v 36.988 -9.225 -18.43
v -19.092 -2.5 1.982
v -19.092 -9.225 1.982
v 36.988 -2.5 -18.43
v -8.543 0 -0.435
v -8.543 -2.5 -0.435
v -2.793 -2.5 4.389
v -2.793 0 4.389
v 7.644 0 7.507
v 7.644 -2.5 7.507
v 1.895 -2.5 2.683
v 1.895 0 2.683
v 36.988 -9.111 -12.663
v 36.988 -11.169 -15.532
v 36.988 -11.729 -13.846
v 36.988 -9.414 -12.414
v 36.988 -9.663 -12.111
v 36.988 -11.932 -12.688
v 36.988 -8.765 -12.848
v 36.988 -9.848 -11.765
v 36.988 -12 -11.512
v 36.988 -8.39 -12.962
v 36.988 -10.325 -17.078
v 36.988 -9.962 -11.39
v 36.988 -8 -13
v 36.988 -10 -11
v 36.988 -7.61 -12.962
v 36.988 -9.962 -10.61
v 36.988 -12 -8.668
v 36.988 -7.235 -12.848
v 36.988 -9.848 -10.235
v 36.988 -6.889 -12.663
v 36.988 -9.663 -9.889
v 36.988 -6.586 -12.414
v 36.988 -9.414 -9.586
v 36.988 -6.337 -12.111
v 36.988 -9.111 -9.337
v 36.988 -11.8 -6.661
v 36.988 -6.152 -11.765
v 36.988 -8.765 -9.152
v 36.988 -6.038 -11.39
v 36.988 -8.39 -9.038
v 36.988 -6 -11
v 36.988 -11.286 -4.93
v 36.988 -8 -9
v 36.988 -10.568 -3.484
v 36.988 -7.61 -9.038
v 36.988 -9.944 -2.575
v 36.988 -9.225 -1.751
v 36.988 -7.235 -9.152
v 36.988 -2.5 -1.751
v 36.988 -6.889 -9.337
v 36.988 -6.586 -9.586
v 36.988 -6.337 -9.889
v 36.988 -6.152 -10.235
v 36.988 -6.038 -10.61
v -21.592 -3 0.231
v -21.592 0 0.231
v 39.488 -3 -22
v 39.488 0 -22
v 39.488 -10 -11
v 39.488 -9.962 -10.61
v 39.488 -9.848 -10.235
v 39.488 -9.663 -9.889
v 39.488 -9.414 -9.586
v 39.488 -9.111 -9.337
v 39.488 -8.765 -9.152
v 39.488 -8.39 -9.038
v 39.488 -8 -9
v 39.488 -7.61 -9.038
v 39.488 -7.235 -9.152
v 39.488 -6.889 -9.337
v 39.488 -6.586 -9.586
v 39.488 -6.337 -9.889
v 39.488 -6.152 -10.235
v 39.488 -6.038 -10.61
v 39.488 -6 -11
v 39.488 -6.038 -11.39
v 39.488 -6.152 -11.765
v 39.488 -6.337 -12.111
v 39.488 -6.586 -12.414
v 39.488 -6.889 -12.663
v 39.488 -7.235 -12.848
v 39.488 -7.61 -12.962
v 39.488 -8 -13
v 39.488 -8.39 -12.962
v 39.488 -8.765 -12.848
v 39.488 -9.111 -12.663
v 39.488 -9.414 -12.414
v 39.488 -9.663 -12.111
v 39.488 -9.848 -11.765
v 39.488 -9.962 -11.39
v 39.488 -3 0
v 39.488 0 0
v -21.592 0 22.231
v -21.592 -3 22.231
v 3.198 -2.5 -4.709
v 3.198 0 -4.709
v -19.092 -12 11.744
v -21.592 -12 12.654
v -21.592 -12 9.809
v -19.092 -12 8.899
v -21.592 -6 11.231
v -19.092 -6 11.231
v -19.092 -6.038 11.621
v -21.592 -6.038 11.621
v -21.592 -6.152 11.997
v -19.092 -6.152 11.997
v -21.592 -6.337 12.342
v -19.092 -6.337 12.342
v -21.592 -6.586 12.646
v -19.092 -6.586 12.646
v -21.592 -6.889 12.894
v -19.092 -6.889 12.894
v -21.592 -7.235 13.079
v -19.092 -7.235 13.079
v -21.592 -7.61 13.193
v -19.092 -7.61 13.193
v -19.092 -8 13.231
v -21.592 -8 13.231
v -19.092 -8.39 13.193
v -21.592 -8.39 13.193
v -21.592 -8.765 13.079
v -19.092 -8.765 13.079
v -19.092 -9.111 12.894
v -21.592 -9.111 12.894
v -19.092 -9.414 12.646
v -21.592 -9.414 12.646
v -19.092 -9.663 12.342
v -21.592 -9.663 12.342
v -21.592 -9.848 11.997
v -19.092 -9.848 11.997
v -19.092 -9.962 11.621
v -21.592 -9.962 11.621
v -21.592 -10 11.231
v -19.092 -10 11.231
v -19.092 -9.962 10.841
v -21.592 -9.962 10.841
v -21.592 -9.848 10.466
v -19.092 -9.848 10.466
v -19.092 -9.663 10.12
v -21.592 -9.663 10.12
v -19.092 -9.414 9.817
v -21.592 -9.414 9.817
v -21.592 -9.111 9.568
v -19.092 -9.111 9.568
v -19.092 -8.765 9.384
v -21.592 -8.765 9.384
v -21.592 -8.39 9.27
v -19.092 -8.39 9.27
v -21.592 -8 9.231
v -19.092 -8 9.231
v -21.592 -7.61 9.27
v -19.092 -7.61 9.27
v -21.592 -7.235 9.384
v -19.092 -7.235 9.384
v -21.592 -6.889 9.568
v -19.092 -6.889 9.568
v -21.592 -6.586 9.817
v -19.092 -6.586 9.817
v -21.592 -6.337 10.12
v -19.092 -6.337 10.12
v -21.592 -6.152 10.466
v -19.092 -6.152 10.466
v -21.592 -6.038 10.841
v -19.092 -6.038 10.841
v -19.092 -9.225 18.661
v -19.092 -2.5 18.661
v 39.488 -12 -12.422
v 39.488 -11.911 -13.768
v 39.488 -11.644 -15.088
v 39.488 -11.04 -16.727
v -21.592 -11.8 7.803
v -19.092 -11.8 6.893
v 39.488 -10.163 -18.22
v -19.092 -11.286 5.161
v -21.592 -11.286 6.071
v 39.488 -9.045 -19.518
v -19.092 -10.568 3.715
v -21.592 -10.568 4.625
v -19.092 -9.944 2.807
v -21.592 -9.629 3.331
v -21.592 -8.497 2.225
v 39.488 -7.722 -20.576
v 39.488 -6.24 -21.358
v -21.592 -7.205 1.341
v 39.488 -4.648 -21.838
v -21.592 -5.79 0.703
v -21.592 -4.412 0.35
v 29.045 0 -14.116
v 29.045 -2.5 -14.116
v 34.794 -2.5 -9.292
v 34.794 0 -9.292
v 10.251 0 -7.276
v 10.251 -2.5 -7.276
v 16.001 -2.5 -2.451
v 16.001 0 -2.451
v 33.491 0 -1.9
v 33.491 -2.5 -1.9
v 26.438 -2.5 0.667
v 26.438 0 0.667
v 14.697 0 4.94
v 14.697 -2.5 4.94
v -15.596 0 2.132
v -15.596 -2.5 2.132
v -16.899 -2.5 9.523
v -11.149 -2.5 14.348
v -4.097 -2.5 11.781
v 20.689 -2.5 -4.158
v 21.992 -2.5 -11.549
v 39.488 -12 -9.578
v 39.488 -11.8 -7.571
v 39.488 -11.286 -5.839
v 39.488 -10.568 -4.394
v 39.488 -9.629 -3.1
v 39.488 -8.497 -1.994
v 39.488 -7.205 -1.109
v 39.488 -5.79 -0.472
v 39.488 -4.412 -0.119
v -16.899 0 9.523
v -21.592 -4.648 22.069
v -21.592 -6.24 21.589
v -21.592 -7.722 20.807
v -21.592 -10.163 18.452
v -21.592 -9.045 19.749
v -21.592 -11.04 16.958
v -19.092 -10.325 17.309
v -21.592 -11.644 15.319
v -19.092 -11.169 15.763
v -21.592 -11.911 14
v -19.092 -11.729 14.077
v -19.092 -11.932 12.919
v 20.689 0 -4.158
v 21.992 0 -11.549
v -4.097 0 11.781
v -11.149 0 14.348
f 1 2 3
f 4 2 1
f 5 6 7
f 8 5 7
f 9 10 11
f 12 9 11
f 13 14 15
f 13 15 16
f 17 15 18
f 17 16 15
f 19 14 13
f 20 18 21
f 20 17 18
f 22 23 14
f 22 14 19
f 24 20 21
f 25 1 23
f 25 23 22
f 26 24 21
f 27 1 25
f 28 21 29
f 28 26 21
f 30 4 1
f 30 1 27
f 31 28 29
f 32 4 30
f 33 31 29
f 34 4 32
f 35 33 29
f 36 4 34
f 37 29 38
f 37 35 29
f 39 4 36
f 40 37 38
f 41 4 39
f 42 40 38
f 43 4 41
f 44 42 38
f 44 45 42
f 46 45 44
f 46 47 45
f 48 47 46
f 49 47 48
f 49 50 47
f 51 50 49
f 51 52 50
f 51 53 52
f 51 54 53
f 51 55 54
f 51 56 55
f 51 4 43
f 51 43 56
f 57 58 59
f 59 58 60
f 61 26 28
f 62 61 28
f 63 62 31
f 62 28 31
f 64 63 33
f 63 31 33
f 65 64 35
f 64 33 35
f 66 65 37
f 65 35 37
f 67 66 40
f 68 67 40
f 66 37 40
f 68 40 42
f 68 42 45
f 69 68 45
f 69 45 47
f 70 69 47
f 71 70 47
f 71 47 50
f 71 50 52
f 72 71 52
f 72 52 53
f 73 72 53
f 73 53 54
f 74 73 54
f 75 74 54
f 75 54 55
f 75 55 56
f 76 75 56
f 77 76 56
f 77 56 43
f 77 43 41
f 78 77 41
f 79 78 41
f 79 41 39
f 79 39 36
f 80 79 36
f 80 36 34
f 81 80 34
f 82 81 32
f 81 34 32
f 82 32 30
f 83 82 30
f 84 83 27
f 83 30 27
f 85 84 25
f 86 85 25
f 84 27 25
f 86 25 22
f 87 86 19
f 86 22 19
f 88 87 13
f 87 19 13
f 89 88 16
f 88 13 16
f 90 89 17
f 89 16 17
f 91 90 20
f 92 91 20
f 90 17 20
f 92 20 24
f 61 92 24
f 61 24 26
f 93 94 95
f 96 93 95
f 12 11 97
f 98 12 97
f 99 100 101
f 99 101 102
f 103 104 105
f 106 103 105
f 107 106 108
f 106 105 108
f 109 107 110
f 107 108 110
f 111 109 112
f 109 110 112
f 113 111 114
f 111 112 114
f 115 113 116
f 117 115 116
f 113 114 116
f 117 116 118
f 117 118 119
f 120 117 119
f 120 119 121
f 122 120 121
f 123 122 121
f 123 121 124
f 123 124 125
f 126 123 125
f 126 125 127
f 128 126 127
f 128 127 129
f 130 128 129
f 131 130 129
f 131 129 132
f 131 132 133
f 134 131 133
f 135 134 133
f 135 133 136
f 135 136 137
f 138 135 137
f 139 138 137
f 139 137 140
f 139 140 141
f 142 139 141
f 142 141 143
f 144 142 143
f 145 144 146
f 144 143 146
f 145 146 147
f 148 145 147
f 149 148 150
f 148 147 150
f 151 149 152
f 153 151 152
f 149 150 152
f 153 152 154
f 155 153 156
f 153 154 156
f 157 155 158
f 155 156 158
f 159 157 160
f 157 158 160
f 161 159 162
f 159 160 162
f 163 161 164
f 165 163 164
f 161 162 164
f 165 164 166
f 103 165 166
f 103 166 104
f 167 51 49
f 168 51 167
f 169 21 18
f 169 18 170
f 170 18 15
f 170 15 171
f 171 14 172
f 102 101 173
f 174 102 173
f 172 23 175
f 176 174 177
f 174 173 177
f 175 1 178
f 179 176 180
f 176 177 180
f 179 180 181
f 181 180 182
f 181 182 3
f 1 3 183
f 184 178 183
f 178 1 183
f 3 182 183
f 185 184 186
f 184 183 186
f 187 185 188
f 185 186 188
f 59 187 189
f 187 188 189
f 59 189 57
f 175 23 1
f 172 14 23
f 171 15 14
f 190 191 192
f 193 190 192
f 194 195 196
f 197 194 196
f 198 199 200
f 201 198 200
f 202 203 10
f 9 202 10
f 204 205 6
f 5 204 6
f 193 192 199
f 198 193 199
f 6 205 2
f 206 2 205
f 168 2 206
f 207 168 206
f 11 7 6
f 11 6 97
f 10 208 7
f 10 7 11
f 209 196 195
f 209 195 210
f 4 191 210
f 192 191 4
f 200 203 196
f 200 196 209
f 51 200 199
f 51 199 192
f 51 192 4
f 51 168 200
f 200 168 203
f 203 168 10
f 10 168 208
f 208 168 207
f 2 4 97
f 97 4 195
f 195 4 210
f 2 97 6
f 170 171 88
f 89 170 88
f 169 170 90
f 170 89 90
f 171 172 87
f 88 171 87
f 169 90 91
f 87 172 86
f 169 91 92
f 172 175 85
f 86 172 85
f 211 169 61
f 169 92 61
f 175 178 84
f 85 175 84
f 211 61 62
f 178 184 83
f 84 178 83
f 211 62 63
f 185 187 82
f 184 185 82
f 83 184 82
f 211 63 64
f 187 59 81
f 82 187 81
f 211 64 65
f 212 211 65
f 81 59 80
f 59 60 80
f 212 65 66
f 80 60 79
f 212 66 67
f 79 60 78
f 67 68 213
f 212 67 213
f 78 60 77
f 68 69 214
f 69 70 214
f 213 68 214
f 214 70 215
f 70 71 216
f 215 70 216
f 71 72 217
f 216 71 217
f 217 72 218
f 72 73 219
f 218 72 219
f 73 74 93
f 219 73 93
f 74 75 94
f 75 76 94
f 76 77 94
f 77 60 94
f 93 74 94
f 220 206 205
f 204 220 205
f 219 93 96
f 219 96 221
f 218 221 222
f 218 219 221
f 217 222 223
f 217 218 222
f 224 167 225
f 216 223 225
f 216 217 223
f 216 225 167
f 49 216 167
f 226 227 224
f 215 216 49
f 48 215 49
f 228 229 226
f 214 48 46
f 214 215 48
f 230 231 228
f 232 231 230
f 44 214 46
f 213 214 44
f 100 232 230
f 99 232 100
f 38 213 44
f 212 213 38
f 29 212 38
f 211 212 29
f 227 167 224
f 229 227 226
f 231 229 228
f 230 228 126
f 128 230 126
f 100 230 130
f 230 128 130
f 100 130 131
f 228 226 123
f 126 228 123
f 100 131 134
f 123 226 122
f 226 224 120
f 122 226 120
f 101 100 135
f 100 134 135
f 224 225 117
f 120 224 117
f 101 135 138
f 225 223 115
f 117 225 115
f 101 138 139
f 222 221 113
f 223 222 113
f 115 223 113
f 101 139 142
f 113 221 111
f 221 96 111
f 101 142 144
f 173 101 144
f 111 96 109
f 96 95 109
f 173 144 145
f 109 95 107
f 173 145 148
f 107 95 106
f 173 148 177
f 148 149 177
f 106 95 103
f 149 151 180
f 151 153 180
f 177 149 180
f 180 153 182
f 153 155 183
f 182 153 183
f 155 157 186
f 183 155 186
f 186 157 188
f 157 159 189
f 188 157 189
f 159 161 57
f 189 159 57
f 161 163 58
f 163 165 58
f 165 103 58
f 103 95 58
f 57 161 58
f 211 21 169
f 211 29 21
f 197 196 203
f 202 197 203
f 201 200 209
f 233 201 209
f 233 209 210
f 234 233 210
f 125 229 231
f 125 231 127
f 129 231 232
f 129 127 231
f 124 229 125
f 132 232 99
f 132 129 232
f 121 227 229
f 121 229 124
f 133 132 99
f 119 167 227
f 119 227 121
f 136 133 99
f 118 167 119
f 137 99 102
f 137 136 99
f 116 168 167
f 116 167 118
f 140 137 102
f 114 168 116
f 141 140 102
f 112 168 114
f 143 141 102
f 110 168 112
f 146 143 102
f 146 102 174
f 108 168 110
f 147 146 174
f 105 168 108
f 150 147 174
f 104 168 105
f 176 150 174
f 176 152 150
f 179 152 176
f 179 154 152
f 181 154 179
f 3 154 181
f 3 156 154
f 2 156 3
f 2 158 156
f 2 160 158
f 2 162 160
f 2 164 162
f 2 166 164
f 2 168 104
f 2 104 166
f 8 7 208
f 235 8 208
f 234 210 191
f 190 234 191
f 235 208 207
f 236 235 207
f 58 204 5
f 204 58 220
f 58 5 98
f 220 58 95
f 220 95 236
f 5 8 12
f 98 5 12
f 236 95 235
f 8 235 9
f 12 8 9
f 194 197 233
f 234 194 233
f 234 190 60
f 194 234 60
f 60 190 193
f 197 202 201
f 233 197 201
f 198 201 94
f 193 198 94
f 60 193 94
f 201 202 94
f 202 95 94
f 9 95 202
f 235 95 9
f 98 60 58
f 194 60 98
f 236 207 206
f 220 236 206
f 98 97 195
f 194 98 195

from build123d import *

# Parameters (mm, degrees)
F1_DEPTH    = 12
F2_T        = -2.5
F4_D        = 4
F4_DEPTH    = 6
F4_TIP      = 1.2017212381
F6_D        = 4
F6_DEPTH    = 6
F6_TIP      = 1.2017212381
F7_T1_DEPTH = 110
F7_T3_DEPTH = 110
F9_DEPTH    = 25


# Not quite as in the source:
# - a fillet or chamfer that OpenCascade refuses, or shapes differently, is made with other operations: its cross-section is extruded or revolved along the edge and cut away or added


with BuildPart() as f1:
    # F0 (on Front) → F1 (new body)
    with BuildSketch(Plane.XZ):
        Polygon((39.4877206884, 0), (-21.5922996627, 22.2313093162), (-21.5922996627, 0.2313093162), (39.4877206884, -22), align=None)
    extrude(amount=F1_DEPTH)

    # F2
    f2_openings = [f1.faces().sort_by_distance(p)[0] for p in [
        (8.947711, -12, 0.115655),
    ]]
    offset(amount=F2_T, openings=f2_openings)

    # F4
    with Locations(Plane(origin=(-21.5922996627, 0, 0), x_dir=(0, -1, 0), z_dir=(-1, 0, 0))):
        with Locations((8, 11.2313093162)):
            Hole(F4_D / 2, depth=F4_DEPTH)
            with Locations((0, 0, -(F4_DEPTH + F4_TIP / 2))):  # 118° drill point
                Cone(0, F4_D / 2, F4_TIP, mode=Mode.SUBTRACT)

    # F6
    with Locations(Plane.YZ.offset(39.4877206884)):
        with Locations((-8, -11)):
            Hole(F6_D / 2, depth=F6_DEPTH)
            with Locations((0, 0, -(F6_DEPTH + F6_TIP / 2))):  # 118° drill point
                Cone(0, F6_D / 2, F6_TIP, mode=Mode.SUBTRACT)

    # F7: fillet of radius 9 on 2 edges, made by hand

    # F7_s2 → F7_t1 (cut)
    with BuildSketch(Plane(origin=(56.0116188142, 0, -20.3865620214), x_dir=(0, 1, 0), z_dir=(-0.9396926208, 0, 0.3420201433))):
        with BuildLine():
            ThreePointArc((-3, -13.5055958894), (-9.3639610307, -10.8695569201), (-12, -4.5055958894))
            Line((-12, -4.5055958894), (-12, -13.5055958894))
            Line((-12, -13.5055958894), (-3, -13.5055958894))
        make_face()
    extrude(amount=F7_T1_DEPTH, mode=Mode.SUBTRACT)

    # F7_s4 → F7_t3 (cut)
    with BuildSketch(Plane(origin=(-40.2839057657, 0, 14.6621426187), x_dir=(0, 1, 0), z_dir=(0.9396926208, 0, -0.3420201433))):
        with BuildLine():
            ThreePointArc((-12, 1.8323582321), (-9.3639610307, -4.5316027985), (-3, -7.1676417679))
            Line((-3, -7.1676417679), (-12, -7.1676417679))
            Line((-12, -7.1676417679), (-12, 1.8323582321))
        make_face()
    extrude(amount=F7_T3_DEPTH, mode=Mode.SUBTRACT)

    # F8 (on face) → F9 (cut)
    with BuildSketch(Plane.XZ.offset(2.5)):
        Polygon((-8.5428162153, -0.4354697523), (-2.7932286645, 4.389007041), (-4.0965543521, 11.7805343179), (-11.1494675905, 14.3475848015), (-16.8990551413, 9.5231080082), (-15.5957294537, 2.1315807313), align=None)
        Polygon((10.2510362004, -7.2758726188), (16.0006237512, -2.4513958255), (14.6972980636, 4.9401314514), (7.6443848253, 7.507181935), (1.8947972745, 2.6827051417), (3.198122962, -4.7088221352), align=None)
        Polygon((29.0448886161, -14.1162754854), (34.7944761669, -9.2917986921), (33.4911504793, -1.9002714151), (26.438237241, 0.6667790685), (20.6886496902, -4.1576977248), (21.9919753777, -11.5492250017), align=None)
    extrude(amount=-F9_DEPTH, mode=Mode.SUBTRACT)


solid = f1.part
